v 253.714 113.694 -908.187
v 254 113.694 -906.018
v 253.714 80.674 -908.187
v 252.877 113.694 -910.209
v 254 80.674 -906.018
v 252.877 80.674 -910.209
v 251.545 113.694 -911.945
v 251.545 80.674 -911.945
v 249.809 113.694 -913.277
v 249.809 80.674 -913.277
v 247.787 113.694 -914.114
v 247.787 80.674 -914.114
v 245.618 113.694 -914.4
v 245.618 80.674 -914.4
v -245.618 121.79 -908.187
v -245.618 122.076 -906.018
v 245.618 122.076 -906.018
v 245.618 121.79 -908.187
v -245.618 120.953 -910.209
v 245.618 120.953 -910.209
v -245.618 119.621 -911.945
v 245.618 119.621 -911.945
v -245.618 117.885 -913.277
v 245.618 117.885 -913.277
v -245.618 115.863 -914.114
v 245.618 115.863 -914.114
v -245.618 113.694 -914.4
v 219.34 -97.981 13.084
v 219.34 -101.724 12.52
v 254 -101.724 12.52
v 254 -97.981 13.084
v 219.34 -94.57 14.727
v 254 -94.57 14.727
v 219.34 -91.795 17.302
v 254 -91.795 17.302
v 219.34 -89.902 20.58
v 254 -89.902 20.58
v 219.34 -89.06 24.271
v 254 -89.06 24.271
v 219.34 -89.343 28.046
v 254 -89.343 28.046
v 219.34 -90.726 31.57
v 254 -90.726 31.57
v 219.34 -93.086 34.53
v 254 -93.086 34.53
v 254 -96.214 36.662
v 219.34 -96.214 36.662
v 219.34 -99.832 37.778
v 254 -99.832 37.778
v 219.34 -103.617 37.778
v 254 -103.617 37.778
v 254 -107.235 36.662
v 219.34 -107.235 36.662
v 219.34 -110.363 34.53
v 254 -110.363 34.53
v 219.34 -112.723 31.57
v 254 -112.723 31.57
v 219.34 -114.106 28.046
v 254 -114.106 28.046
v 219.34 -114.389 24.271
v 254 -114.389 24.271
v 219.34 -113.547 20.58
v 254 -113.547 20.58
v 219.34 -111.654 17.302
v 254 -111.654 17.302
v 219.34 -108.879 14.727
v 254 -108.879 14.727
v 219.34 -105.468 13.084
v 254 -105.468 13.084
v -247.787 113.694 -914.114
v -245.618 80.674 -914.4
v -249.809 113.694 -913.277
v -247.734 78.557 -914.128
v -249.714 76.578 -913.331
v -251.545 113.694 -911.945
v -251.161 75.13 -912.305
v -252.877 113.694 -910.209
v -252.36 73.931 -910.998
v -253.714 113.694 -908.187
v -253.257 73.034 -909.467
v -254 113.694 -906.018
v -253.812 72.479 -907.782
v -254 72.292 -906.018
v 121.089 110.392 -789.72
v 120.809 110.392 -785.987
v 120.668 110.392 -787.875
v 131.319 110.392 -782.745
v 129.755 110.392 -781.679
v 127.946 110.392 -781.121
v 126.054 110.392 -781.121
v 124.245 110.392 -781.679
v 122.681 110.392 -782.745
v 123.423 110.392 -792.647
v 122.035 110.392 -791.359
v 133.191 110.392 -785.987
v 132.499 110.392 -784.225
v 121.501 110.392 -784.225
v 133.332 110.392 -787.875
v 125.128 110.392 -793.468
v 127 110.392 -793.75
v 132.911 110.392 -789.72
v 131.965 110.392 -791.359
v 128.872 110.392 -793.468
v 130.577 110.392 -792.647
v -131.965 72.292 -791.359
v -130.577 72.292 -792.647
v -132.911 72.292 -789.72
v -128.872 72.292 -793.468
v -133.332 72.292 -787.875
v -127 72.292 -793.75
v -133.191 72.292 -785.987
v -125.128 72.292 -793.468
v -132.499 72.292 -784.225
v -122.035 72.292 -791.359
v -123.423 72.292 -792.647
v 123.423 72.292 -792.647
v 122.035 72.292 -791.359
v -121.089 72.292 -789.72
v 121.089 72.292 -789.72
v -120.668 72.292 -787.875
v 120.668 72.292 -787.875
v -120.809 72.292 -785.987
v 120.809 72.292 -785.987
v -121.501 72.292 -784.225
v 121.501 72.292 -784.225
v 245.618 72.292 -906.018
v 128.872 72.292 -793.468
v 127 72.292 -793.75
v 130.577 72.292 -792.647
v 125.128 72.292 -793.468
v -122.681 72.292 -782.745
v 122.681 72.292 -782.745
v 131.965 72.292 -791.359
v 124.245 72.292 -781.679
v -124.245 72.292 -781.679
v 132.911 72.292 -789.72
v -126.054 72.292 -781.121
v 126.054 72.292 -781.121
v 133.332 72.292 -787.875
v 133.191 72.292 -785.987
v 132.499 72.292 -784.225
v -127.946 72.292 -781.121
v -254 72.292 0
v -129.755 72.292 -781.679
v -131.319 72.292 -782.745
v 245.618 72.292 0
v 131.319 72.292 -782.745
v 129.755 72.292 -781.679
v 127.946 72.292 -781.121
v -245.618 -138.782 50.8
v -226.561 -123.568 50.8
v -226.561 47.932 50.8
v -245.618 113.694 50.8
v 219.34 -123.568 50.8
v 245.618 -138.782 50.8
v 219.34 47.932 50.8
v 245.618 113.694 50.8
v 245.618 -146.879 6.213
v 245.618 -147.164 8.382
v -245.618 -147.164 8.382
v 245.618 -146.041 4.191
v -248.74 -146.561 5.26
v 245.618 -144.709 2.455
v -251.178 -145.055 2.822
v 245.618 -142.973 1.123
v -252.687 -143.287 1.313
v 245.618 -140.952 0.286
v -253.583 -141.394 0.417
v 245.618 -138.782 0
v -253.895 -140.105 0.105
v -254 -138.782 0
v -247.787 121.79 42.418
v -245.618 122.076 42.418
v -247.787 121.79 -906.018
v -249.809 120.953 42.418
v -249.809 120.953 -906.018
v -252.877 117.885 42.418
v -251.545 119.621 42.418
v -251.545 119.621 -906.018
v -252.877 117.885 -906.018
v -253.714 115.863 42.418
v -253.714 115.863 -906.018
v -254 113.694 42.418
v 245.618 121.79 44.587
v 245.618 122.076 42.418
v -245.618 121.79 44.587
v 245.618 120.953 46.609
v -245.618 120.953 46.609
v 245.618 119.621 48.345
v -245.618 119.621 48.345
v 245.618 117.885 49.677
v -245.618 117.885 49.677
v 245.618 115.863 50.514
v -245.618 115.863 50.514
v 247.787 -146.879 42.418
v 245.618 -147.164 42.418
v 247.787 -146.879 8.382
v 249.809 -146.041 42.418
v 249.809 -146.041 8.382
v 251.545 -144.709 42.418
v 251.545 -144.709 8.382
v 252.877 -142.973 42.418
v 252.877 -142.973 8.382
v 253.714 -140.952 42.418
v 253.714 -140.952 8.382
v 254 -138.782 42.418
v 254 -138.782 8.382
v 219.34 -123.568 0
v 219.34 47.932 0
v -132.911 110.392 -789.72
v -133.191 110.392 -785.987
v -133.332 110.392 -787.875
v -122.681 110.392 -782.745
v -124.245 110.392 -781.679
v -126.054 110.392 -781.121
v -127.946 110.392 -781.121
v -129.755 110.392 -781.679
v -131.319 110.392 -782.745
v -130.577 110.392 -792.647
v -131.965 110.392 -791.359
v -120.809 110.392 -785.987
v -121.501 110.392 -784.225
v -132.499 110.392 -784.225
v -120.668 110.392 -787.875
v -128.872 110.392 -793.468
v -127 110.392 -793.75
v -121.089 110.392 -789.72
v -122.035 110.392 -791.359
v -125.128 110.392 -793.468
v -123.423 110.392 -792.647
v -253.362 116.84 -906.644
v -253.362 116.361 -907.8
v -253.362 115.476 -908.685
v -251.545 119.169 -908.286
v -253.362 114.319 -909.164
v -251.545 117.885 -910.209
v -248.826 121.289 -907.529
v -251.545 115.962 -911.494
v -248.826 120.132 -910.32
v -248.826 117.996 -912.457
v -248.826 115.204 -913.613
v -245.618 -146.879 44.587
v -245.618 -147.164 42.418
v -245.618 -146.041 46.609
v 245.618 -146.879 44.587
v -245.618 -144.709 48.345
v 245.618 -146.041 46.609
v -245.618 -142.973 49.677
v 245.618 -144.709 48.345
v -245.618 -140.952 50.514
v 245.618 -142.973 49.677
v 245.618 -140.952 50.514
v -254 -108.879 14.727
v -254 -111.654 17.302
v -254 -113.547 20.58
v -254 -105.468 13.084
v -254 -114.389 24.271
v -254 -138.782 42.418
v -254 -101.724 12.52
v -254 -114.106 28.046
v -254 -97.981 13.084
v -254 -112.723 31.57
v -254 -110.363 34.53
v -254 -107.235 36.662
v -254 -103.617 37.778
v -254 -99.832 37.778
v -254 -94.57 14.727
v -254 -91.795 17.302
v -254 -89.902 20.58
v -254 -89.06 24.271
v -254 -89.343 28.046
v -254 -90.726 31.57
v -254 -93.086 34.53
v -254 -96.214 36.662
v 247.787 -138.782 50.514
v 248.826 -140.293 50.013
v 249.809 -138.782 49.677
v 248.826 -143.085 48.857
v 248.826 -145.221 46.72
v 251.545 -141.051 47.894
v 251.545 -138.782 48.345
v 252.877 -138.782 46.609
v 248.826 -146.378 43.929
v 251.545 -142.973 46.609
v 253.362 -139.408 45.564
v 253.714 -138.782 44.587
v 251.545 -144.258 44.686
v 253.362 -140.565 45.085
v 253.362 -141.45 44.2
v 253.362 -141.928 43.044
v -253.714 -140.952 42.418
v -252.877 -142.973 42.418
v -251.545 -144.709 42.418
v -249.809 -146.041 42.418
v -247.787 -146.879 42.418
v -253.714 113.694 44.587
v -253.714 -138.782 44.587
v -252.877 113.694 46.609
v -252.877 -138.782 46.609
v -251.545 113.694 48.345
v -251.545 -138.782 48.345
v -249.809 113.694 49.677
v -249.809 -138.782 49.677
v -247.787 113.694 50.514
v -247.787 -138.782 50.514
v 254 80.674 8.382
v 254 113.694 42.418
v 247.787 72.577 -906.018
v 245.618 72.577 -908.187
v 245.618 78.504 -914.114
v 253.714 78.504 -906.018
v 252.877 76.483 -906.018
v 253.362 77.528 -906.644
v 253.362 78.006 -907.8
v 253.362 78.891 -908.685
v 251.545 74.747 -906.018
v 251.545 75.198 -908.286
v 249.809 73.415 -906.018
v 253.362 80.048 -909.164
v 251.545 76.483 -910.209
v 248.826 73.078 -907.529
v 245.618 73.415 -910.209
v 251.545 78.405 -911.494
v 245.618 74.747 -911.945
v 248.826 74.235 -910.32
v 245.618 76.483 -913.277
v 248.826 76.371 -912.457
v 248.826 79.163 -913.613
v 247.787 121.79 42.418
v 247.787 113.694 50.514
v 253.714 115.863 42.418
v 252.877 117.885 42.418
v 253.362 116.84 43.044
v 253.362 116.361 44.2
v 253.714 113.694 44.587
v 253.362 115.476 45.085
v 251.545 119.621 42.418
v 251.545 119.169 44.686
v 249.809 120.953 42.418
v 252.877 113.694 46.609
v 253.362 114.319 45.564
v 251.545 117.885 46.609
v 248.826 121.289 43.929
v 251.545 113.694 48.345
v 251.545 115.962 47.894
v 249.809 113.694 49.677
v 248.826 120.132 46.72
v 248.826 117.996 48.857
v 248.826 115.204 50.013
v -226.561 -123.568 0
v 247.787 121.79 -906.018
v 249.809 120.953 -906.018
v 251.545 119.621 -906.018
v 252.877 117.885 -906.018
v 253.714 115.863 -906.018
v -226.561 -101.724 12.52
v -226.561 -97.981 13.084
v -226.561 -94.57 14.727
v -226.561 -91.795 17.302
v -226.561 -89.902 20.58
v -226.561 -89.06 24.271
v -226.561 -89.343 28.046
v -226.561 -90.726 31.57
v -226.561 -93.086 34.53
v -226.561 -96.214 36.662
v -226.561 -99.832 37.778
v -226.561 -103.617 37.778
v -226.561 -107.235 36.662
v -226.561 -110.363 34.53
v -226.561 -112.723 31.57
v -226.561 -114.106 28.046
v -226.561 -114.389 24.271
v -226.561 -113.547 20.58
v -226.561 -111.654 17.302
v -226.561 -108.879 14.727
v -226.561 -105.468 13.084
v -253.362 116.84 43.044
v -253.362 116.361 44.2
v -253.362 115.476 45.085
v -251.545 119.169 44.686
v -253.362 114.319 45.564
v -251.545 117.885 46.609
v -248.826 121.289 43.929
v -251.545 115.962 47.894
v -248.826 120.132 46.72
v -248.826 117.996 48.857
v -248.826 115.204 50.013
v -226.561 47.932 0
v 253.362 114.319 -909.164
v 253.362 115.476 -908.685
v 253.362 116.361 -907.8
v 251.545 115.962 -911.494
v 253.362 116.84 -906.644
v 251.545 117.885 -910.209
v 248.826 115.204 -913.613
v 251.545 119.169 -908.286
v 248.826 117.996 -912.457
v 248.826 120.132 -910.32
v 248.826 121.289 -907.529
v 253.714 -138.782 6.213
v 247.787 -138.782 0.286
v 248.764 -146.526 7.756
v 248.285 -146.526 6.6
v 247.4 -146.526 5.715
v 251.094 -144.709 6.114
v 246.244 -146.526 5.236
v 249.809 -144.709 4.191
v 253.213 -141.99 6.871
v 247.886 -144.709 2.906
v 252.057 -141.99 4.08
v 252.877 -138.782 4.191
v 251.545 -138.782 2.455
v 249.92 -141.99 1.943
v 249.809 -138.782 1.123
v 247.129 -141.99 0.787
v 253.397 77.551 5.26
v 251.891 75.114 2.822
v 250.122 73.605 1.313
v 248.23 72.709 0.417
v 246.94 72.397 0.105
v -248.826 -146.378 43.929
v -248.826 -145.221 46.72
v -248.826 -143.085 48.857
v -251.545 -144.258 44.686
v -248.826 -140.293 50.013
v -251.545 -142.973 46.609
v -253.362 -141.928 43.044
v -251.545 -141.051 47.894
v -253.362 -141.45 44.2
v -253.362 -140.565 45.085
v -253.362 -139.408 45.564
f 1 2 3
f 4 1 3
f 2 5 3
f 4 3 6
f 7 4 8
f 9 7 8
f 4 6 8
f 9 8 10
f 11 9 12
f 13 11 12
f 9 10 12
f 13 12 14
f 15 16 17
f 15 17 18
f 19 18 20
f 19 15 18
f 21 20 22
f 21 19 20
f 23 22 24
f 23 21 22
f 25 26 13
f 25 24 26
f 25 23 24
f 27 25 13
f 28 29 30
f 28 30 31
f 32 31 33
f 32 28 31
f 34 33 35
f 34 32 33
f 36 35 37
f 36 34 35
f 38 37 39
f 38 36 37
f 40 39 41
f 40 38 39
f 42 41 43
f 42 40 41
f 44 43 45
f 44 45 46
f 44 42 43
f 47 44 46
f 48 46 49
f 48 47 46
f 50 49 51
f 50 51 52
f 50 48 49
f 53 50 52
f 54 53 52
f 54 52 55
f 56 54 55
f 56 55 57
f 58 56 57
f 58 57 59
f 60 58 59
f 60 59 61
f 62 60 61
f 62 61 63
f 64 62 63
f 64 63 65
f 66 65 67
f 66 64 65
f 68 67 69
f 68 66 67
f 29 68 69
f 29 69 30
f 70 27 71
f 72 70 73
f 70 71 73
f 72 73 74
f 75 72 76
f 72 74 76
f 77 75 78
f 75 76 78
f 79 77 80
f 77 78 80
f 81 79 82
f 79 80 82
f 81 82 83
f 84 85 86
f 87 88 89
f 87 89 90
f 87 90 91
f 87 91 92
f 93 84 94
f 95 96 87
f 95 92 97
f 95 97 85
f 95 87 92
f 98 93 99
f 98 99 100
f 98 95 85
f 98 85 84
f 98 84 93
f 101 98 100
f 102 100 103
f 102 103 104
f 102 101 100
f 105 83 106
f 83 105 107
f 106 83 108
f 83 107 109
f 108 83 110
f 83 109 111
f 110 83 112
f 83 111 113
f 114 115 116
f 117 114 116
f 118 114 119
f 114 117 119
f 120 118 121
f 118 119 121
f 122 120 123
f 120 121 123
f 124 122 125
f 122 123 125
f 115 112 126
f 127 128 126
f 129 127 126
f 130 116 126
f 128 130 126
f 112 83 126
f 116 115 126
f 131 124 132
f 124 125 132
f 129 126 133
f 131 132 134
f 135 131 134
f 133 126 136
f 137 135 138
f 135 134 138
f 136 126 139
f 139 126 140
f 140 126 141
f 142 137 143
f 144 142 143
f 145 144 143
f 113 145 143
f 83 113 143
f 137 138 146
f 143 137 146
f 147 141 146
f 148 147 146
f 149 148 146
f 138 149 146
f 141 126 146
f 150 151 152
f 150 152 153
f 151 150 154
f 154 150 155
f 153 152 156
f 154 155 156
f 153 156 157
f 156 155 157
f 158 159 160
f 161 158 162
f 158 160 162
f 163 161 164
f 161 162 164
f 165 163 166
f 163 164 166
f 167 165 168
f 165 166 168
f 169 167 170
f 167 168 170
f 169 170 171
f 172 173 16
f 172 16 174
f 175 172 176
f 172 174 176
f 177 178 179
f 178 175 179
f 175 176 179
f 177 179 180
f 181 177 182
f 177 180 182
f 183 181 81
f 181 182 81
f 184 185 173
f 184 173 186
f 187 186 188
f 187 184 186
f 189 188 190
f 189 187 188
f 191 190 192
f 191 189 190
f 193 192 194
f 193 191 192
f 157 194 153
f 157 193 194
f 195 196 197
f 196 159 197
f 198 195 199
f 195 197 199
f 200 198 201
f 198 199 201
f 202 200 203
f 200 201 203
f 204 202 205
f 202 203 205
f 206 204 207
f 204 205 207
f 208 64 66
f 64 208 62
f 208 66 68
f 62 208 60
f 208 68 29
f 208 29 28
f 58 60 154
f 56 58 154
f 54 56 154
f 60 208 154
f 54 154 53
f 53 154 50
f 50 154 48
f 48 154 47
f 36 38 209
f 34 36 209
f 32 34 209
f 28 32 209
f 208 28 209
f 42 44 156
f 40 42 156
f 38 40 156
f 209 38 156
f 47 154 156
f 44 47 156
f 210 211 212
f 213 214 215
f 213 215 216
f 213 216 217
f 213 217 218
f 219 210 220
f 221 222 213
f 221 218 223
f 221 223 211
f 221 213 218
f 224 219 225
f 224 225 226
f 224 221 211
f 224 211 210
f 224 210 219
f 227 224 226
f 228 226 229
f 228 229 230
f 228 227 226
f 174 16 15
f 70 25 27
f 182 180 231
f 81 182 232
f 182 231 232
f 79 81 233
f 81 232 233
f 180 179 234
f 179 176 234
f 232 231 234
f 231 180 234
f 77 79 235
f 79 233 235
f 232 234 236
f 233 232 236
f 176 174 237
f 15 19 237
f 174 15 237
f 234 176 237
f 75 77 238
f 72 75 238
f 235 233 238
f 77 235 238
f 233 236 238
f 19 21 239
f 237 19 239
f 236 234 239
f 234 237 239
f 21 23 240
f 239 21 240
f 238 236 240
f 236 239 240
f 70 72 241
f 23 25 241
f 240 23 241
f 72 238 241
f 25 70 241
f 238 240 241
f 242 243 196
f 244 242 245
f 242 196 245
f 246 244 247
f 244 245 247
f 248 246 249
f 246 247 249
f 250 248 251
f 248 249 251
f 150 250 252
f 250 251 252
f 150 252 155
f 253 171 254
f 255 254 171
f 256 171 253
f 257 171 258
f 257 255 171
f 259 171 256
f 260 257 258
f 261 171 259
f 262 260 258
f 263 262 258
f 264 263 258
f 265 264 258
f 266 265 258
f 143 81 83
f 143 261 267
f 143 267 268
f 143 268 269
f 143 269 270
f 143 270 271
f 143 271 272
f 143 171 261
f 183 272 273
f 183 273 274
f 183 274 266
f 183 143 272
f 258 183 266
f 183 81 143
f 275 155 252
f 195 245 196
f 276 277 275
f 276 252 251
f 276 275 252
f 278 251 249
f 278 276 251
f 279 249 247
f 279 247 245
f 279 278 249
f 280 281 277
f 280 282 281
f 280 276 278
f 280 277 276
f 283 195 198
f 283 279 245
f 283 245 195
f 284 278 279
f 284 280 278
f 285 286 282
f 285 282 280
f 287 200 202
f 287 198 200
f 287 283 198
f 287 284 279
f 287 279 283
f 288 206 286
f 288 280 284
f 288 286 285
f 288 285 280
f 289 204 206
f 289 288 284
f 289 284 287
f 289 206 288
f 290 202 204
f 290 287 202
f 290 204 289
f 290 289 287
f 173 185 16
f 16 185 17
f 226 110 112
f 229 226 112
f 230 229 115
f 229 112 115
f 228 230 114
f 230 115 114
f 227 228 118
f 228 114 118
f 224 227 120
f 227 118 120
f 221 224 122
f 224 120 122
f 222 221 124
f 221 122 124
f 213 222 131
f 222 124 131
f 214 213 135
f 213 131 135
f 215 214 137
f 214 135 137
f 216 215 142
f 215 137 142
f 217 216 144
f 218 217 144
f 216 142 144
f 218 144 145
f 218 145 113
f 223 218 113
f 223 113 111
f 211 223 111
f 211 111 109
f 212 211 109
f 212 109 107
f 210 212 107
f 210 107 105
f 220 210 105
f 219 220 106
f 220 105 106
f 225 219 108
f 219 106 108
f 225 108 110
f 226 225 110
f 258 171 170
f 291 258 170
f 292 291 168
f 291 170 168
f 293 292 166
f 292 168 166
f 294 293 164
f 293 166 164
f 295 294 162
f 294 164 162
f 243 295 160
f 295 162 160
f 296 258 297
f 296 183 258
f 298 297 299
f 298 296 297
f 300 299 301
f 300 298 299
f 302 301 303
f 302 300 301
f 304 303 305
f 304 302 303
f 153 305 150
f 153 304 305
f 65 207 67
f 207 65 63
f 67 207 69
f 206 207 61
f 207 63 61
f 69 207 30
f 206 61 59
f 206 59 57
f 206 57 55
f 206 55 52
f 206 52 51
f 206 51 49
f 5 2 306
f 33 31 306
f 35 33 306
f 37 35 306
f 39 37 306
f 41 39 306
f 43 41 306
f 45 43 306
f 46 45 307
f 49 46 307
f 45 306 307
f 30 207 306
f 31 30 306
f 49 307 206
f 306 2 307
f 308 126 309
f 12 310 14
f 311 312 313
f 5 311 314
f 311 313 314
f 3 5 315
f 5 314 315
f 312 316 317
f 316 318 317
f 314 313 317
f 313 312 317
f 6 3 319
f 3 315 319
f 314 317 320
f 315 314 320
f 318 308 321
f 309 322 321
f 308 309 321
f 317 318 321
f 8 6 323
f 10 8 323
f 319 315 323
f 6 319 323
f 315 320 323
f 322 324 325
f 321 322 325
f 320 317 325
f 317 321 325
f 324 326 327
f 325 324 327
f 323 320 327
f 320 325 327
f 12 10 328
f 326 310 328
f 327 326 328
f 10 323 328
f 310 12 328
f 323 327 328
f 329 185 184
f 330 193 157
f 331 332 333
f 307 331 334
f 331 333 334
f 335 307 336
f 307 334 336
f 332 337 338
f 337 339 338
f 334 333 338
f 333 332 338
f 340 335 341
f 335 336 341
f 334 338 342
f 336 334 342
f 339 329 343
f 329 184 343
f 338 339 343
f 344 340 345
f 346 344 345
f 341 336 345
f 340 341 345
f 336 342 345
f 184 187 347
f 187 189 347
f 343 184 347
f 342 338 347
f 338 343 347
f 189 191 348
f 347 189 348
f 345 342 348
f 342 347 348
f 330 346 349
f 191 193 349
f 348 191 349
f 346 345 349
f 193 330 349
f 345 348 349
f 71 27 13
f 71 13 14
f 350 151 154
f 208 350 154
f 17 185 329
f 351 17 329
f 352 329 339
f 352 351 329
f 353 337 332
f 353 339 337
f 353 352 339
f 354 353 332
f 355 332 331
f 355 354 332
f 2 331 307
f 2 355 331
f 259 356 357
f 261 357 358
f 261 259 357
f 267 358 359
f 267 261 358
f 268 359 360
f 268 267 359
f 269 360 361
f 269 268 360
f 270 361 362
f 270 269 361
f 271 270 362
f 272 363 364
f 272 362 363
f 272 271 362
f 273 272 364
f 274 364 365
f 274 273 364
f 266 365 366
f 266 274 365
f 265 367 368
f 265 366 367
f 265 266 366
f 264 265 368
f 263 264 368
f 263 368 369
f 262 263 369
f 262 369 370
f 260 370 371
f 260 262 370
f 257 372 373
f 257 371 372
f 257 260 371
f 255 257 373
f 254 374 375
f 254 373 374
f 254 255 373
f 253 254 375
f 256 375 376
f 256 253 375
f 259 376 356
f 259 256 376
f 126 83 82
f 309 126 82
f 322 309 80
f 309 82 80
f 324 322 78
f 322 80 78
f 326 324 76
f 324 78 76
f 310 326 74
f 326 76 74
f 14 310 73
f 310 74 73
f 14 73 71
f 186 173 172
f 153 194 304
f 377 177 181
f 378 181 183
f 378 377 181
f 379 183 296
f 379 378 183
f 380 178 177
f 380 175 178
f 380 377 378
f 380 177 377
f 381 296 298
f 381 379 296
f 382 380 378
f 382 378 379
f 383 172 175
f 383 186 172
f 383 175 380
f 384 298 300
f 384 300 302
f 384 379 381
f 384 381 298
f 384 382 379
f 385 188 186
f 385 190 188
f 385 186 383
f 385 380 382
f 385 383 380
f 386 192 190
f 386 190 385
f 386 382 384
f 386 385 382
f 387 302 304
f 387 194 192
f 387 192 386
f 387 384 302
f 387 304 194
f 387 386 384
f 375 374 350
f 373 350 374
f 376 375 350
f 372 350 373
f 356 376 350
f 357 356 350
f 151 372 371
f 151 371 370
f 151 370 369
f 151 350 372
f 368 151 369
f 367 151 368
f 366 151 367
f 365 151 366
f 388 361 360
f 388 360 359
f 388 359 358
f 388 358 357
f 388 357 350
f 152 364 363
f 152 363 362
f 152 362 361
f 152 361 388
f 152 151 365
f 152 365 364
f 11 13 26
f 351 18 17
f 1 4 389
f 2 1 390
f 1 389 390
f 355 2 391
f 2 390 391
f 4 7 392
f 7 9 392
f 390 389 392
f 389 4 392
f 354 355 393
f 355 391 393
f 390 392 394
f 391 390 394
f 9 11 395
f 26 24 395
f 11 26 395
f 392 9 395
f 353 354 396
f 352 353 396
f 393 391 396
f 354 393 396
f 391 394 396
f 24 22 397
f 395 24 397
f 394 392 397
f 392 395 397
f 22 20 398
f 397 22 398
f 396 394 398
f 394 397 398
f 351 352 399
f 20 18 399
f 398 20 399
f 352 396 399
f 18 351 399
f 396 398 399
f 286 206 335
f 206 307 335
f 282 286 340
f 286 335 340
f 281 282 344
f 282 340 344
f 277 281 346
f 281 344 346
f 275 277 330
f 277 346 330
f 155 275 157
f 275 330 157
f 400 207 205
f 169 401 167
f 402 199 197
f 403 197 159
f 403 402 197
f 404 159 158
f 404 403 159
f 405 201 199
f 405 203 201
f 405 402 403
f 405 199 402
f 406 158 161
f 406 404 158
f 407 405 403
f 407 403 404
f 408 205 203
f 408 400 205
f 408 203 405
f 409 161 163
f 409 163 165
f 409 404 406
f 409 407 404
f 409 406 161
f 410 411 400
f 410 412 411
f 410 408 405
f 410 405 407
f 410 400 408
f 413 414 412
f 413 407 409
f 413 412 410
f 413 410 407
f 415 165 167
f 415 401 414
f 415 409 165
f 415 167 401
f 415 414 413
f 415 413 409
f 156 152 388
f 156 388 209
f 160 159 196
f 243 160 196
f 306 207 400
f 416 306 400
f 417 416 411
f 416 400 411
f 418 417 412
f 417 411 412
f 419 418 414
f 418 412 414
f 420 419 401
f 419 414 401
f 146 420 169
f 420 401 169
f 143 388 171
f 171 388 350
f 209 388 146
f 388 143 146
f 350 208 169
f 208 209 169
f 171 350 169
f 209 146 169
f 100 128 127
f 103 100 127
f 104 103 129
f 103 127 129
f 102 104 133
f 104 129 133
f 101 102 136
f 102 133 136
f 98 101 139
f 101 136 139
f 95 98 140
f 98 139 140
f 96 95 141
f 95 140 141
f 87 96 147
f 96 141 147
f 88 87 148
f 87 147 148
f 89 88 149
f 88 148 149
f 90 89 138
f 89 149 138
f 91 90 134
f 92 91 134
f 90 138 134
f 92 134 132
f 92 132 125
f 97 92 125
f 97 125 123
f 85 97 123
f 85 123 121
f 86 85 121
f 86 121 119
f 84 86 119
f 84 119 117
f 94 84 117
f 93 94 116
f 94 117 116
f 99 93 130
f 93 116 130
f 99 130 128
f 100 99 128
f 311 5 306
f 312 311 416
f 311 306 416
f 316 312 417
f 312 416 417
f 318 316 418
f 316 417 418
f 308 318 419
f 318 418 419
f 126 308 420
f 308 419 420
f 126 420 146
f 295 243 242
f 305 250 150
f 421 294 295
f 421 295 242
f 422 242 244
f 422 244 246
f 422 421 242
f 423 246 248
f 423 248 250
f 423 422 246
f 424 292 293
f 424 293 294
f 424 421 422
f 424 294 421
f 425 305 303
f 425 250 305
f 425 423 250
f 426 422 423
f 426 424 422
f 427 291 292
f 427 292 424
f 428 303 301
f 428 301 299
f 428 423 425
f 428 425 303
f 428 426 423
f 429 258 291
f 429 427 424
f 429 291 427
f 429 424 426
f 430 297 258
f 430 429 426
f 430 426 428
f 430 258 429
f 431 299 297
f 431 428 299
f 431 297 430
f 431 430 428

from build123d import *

# Parameters (mm, degrees)
SKETCH1_R           = 12.7
BOSS_EXTRUDE1_DEPTH = 254
FILLET1_R           = 8.382
FILLET2_R           = 8.382
SKETCH6_W           = 445.900168358
SKETCH6_H           = 171.500064753
CUT_EXTRUDE4_DEPTH  = 1009.8530191
SKETCH2_R           = 6.35
CUT_EXTRUDE5_DEPTH  = 38.1


with BuildPart() as part:
    # Sketch1 → Boss-Extrude1 (new, symmetric)
    with BuildSketch(Plane(origin=(0, 0, 0), x_dir=(0, 0, -1), z_dir=(1, 0, 0))):
        Polygon((-50.8, 122.075554067), (914.4, 122.075554067), (914.4, 72.291554067), (0, 72.291554067), (0, -147.164445933), (-50.8, -147.164445933), align=None)
        with Locations((-25.220095835, -101.724479604)):
            Circle(SKETCH1_R, mode=Mode.SUBTRACT)
    extrude(amount=BOSS_EXTRUDE1_DEPTH, both=True)

    # Fillet1
    fillet1_edges = [part.edges().sort_by_distance(p)[0] for p in [
        (0, 122.075554067, 50.8),
        (0, 122.075554067, -914.4),
        (0, 72.291554067, -914.4),
        (0, -147.164445933, 50.8),
        (254, -37.436445933, 0),
        (254, 72.291554067, -457.2),
        (254, 97.183554067, -914.4),
        (254, 122.075554067, -431.8),
        (254, -12.544445933, 50.8),
        (-254, 122.075554067, -431.8),
        (-254, 97.183554067, -914.4),
        (-254, -12.544445933, 50.8),
    ]]
    fillet(fillet1_edges, radius=FILLET1_R)

    # Fillet2
    # the kernel refuses this fillet: 8.382 mm, written as the material it takes off along each edge
    with BuildSketch(Plane(origin=(245.618, -138.782445933, 42.418), x_dir=(0, -1, 0), z_dir=(1, 0, 0))) as fillet2_piece_1_section:
        Polygon((0, 0), (FILLET2_R, 0), (FILLET2_R, -FILLET2_R), (0, -FILLET2_R), align=None)
    fillet2_piece_1 = extrude(amount=FILLET2_R, mode=Mode.PRIVATE)
    fillet2_piece_1 = fillet2_piece_1 - Plane(origin=(245.618, -138.782445933, 42.418), x_dir=(0, 0.7071067811865477, -0.7071067811865474), z_dir=(1, 0, 0)) * Sphere(FILLET2_R, mode=Mode.PRIVATE)
    add(fillet2_piece_1, mode=Mode.SUBTRACT)
    with BuildSketch(Plane(origin=(-245.618, -138.782445933, 42.418), x_dir=(0, -1, 0), z_dir=(-1, 0, 0))) as fillet2_piece_2_section:
        Polygon((0, 0), (FILLET2_R, 0), (FILLET2_R, FILLET2_R), (0, FILLET2_R), align=None)
    fillet2_piece_2 = extrude(amount=FILLET2_R, mode=Mode.PRIVATE)
    fillet2_piece_2 = fillet2_piece_2 - Plane(origin=(-245.618, -138.782445933, 42.418), x_dir=(0, 0.7071067811865477, -0.7071067811865474), z_dir=(-1, 0, 0)) * Sphere(FILLET2_R, mode=Mode.PRIVATE)
    add(fillet2_piece_2, mode=Mode.SUBTRACT)
    with BuildSketch(Plane(origin=(254, -147.164445933, 8.382), x_dir=(0, 1, 0), z_dir=(0, 0, 1))) as fillet2_piece_3:
        with BuildLine():
            CenterArc((FILLET2_R, FILLET2_R), FILLET2_R, 180, 90)
            Line((0, FILLET2_R), (0, 0))
            Line((0, 0), (FILLET2_R, 0))
        make_face()
    extrude(amount=34.036, mode=Mode.SUBTRACT)
    with BuildSketch(Plane(origin=(-254, -147.164445933, -20.955), x_dir=(0, 1, 0), z_dir=(0, 0, 1))) as fillet2_piece_4:
        with BuildLine():
            CenterArc((FILLET2_R, -FILLET2_R), FILLET2_R, 90, 90)
            Line((0, -FILLET2_R), (0, 0))
            Line((0, 0), (FILLET2_R, 0))
        make_face()
    extrude(amount=63.373, mode=Mode.SUBTRACT)
    with BuildSketch(Plane(origin=(-274.955, -147.164445933, 0), x_dir=(0, 1, 0), z_dir=(1, 0, 0))) as fillet2_piece_5:
        with BuildLine():
            CenterArc((FILLET2_R, FILLET2_R), FILLET2_R, 180, 90)
            Line((0, FILLET2_R), (0, 0))
            Line((0, 0), (FILLET2_R, 0))
        make_face()
    extrude(amount=520.573, mode=Mode.SUBTRACT)
    with BuildSketch(Plane(origin=(245.618, -147.164445933, 8.382), x_dir=(1, 0, 0), z_dir=(0, 0, 1))) as fillet2_piece_6:
        with BuildLine():
            CenterArc((8.382 - FILLET2_R, FILLET2_R), FILLET2_R, 270, 90)
            Line((8.382, FILLET2_R), (8.382, 0))
            Line((8.382, 0), (8.382 - FILLET2_R, 0))
        make_face()
    revolve(axis=Axis((245.618, -147.164445933, 8.382), (0, 1, 0)), revolution_arc=90, mode=Mode.SUBTRACT)

    # Sketch6 → Cut-Extrude4 (cut, through all)
    with BuildSketch(Plane.XY.offset(50.8)):
        with Locations((-3.610527679, -37.818139686)):
            Rectangle(SKETCH6_W, SKETCH6_H)
    extrude(amount=-CUT_EXTRUDE4_DEPTH, mode=Mode.SUBTRACT)

    # Sketch2 → Cut-Extrude5 (cut)
    with BuildSketch(Plane.XZ.offset(-72.291554067)):
        with Locations(Location((-127, -787.4, 0), (0, 0, 270))):
            Circle(SKETCH2_R)
        with Locations(Location((127, -787.4, 0), (0, 0, 270))):
            Circle(SKETCH2_R)
    extrude(amount=-CUT_EXTRUDE5_DEPTH, mode=Mode.SUBTRACT)


solid = part.part
